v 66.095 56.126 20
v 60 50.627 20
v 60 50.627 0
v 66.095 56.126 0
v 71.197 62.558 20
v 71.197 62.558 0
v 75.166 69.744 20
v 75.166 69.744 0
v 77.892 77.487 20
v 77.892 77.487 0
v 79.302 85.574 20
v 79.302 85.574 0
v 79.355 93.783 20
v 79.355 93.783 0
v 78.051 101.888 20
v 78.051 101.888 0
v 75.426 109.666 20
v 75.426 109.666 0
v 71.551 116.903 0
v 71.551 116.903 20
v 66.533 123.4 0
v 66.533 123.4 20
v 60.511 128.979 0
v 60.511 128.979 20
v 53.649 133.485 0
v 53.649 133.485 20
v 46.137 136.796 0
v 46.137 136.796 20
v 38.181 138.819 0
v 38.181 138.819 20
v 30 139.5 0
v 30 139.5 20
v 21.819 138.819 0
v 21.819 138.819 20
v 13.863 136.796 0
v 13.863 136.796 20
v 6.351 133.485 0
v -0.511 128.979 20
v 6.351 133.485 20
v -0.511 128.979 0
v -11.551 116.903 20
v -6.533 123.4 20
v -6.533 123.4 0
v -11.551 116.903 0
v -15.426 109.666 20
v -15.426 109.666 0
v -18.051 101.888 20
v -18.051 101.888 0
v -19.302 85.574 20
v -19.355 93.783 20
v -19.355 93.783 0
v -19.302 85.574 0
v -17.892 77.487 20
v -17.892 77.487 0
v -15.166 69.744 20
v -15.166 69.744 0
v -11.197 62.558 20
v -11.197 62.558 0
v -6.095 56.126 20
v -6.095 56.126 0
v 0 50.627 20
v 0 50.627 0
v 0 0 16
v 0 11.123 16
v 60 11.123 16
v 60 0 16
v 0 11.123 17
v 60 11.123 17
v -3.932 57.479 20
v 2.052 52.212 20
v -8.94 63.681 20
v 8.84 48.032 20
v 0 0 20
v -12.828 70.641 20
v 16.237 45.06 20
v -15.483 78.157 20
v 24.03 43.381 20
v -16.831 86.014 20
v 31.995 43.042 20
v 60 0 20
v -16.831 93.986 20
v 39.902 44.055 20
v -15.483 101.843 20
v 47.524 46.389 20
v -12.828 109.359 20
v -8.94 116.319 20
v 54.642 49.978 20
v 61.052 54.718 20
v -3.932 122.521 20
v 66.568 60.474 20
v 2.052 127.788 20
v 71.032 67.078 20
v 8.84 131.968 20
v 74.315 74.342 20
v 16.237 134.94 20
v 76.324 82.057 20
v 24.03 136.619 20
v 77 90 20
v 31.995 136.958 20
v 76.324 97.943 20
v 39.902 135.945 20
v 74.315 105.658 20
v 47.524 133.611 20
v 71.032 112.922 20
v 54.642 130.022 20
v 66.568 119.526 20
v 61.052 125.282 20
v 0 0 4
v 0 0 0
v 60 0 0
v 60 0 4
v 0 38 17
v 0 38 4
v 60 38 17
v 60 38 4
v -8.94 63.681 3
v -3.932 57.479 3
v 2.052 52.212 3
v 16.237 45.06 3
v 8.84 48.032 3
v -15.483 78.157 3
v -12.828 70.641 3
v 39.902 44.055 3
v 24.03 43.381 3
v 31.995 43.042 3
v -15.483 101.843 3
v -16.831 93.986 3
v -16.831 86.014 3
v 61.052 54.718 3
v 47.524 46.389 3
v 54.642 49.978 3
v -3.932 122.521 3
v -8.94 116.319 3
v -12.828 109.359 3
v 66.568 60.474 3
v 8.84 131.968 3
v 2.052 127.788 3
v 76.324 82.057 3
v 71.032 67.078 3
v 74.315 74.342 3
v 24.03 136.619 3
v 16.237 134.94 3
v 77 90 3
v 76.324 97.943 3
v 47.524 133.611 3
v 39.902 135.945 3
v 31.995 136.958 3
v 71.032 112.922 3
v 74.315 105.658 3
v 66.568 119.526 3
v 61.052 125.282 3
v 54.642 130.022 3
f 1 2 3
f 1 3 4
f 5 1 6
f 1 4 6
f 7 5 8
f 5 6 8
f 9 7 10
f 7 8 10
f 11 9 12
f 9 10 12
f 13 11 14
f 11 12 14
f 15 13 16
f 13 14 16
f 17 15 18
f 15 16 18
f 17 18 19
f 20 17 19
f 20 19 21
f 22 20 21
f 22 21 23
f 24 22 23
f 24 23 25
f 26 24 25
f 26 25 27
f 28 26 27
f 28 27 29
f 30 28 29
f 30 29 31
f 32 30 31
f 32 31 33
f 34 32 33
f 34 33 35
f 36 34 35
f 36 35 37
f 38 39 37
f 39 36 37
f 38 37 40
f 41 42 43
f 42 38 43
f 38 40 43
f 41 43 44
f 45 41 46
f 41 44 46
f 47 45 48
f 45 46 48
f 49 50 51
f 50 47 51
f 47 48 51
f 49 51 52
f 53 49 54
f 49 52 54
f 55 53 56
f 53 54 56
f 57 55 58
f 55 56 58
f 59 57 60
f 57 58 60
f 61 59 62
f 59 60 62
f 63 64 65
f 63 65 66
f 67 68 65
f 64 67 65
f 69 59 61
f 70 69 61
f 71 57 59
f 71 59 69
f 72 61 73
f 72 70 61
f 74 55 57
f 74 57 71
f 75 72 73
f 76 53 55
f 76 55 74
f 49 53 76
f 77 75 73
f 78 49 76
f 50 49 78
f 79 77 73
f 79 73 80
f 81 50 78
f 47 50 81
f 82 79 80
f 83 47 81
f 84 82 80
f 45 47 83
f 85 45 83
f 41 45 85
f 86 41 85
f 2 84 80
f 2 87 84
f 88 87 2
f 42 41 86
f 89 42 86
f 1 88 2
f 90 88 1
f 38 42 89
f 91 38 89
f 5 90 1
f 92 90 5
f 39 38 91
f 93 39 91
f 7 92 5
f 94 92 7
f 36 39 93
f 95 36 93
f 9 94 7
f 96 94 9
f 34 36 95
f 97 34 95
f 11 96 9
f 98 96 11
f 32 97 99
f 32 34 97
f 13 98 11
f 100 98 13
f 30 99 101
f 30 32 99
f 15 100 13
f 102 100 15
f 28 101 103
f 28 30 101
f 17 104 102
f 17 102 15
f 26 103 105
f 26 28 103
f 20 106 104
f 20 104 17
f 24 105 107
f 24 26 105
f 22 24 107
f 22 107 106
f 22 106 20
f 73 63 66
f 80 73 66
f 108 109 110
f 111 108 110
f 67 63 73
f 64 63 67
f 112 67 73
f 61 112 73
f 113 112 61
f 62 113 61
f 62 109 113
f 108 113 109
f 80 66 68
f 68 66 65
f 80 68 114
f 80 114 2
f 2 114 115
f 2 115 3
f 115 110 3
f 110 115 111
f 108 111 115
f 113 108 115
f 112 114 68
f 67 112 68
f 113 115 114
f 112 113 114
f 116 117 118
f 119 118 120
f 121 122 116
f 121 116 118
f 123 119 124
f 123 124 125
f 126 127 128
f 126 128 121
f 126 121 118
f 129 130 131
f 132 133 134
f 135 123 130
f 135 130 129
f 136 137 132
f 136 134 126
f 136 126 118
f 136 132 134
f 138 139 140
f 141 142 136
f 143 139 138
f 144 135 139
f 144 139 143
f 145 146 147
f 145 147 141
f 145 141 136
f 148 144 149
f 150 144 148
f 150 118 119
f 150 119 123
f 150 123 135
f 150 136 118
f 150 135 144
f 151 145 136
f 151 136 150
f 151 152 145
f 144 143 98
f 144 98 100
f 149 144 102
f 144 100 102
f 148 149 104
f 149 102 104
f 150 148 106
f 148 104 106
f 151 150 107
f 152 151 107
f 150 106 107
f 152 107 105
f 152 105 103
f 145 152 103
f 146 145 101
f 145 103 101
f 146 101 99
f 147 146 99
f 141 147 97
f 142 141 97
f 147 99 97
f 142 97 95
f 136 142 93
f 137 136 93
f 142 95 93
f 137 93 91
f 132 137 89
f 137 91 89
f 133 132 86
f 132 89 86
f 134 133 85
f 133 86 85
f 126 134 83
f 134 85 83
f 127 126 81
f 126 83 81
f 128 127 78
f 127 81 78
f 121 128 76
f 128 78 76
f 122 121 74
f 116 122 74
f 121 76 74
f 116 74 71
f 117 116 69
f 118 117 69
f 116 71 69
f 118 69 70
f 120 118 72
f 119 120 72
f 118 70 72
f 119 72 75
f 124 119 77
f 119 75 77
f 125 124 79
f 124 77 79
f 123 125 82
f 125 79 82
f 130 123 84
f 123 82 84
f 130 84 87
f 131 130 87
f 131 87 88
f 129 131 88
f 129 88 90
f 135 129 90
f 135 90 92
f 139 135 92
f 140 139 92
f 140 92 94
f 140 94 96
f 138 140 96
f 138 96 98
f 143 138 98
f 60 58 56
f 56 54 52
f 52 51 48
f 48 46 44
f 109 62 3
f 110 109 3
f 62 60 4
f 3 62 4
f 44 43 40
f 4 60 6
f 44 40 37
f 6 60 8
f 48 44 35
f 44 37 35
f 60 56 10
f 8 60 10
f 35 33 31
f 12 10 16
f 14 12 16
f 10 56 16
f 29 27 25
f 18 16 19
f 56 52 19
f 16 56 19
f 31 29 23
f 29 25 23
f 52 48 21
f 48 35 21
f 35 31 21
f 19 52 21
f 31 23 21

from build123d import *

# Parameters (mm, degrees)
F0_W     = 60
F0_H     = 90
F1_DEPTH = 20
F2_R     = 49.5
F3_DEPTH = 20
F4_R     = 47
F5_DEPTH = 17
F8_DEPTH = 79.501


with BuildPart() as f1:
    # F0 (on Top) → F1 (new body)
    with BuildSketch(Plane.XY):
        with Locations((30, 45)):
            Rectangle(F0_W, F0_H)
    extrude(amount=F1_DEPTH)

    # F2 (on Top) → F3 (join)
    with BuildSketch(Plane.XY):
        with Locations((30, 90)):
            Circle(F2_R)
    extrude(amount=F3_DEPTH)

    # F4 (on face) → F5 (cut)
    with BuildSketch(Plane.XY.offset(20)):
        with Locations((30, 90)):
            Circle(F4_R)
    extrude(amount=-F5_DEPTH, mode=Mode.SUBTRACT)

    # F7 (on face) → F8 (cut, through all)
    with BuildSketch(Plane.YZ.offset(60)):
        Polygon((11.123074, 16), (0, 16), (0, 4), (17.377608, 4), (38, 4), (38, 16), (38, 17), (11.123074, 17), align=None)
    extrude(amount=-F8_DEPTH, mode=Mode.SUBTRACT)


solid = f1.part
